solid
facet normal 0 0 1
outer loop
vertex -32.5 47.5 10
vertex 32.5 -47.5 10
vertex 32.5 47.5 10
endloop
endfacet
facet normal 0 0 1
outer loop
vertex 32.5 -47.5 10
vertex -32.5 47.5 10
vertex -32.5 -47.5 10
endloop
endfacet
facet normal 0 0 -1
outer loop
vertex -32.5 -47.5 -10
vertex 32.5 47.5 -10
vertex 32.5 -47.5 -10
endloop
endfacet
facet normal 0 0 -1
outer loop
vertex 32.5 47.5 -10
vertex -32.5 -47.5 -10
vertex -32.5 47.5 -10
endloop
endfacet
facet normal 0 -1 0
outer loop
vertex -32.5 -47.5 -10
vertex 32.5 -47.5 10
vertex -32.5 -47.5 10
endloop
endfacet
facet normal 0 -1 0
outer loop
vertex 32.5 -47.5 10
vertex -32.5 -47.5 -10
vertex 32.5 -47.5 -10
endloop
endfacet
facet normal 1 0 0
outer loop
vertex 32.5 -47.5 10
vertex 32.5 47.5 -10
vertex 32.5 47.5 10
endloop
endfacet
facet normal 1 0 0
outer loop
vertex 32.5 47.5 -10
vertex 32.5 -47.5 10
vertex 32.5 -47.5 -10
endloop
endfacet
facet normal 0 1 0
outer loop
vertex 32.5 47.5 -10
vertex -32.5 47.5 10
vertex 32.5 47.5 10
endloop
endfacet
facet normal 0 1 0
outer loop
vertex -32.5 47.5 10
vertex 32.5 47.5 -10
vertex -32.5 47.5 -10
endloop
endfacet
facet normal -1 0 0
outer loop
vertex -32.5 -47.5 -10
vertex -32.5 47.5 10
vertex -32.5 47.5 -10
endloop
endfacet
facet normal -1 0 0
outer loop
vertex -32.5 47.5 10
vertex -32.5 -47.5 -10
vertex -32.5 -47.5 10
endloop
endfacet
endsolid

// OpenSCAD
// ========================================
// a 65 x 95 x 20 mm box
// NeuroCAD canonical IR; dimensions are millimetres
// ========================================
$fn = 48;

cube(size=[65, 95, 20], center=true);
